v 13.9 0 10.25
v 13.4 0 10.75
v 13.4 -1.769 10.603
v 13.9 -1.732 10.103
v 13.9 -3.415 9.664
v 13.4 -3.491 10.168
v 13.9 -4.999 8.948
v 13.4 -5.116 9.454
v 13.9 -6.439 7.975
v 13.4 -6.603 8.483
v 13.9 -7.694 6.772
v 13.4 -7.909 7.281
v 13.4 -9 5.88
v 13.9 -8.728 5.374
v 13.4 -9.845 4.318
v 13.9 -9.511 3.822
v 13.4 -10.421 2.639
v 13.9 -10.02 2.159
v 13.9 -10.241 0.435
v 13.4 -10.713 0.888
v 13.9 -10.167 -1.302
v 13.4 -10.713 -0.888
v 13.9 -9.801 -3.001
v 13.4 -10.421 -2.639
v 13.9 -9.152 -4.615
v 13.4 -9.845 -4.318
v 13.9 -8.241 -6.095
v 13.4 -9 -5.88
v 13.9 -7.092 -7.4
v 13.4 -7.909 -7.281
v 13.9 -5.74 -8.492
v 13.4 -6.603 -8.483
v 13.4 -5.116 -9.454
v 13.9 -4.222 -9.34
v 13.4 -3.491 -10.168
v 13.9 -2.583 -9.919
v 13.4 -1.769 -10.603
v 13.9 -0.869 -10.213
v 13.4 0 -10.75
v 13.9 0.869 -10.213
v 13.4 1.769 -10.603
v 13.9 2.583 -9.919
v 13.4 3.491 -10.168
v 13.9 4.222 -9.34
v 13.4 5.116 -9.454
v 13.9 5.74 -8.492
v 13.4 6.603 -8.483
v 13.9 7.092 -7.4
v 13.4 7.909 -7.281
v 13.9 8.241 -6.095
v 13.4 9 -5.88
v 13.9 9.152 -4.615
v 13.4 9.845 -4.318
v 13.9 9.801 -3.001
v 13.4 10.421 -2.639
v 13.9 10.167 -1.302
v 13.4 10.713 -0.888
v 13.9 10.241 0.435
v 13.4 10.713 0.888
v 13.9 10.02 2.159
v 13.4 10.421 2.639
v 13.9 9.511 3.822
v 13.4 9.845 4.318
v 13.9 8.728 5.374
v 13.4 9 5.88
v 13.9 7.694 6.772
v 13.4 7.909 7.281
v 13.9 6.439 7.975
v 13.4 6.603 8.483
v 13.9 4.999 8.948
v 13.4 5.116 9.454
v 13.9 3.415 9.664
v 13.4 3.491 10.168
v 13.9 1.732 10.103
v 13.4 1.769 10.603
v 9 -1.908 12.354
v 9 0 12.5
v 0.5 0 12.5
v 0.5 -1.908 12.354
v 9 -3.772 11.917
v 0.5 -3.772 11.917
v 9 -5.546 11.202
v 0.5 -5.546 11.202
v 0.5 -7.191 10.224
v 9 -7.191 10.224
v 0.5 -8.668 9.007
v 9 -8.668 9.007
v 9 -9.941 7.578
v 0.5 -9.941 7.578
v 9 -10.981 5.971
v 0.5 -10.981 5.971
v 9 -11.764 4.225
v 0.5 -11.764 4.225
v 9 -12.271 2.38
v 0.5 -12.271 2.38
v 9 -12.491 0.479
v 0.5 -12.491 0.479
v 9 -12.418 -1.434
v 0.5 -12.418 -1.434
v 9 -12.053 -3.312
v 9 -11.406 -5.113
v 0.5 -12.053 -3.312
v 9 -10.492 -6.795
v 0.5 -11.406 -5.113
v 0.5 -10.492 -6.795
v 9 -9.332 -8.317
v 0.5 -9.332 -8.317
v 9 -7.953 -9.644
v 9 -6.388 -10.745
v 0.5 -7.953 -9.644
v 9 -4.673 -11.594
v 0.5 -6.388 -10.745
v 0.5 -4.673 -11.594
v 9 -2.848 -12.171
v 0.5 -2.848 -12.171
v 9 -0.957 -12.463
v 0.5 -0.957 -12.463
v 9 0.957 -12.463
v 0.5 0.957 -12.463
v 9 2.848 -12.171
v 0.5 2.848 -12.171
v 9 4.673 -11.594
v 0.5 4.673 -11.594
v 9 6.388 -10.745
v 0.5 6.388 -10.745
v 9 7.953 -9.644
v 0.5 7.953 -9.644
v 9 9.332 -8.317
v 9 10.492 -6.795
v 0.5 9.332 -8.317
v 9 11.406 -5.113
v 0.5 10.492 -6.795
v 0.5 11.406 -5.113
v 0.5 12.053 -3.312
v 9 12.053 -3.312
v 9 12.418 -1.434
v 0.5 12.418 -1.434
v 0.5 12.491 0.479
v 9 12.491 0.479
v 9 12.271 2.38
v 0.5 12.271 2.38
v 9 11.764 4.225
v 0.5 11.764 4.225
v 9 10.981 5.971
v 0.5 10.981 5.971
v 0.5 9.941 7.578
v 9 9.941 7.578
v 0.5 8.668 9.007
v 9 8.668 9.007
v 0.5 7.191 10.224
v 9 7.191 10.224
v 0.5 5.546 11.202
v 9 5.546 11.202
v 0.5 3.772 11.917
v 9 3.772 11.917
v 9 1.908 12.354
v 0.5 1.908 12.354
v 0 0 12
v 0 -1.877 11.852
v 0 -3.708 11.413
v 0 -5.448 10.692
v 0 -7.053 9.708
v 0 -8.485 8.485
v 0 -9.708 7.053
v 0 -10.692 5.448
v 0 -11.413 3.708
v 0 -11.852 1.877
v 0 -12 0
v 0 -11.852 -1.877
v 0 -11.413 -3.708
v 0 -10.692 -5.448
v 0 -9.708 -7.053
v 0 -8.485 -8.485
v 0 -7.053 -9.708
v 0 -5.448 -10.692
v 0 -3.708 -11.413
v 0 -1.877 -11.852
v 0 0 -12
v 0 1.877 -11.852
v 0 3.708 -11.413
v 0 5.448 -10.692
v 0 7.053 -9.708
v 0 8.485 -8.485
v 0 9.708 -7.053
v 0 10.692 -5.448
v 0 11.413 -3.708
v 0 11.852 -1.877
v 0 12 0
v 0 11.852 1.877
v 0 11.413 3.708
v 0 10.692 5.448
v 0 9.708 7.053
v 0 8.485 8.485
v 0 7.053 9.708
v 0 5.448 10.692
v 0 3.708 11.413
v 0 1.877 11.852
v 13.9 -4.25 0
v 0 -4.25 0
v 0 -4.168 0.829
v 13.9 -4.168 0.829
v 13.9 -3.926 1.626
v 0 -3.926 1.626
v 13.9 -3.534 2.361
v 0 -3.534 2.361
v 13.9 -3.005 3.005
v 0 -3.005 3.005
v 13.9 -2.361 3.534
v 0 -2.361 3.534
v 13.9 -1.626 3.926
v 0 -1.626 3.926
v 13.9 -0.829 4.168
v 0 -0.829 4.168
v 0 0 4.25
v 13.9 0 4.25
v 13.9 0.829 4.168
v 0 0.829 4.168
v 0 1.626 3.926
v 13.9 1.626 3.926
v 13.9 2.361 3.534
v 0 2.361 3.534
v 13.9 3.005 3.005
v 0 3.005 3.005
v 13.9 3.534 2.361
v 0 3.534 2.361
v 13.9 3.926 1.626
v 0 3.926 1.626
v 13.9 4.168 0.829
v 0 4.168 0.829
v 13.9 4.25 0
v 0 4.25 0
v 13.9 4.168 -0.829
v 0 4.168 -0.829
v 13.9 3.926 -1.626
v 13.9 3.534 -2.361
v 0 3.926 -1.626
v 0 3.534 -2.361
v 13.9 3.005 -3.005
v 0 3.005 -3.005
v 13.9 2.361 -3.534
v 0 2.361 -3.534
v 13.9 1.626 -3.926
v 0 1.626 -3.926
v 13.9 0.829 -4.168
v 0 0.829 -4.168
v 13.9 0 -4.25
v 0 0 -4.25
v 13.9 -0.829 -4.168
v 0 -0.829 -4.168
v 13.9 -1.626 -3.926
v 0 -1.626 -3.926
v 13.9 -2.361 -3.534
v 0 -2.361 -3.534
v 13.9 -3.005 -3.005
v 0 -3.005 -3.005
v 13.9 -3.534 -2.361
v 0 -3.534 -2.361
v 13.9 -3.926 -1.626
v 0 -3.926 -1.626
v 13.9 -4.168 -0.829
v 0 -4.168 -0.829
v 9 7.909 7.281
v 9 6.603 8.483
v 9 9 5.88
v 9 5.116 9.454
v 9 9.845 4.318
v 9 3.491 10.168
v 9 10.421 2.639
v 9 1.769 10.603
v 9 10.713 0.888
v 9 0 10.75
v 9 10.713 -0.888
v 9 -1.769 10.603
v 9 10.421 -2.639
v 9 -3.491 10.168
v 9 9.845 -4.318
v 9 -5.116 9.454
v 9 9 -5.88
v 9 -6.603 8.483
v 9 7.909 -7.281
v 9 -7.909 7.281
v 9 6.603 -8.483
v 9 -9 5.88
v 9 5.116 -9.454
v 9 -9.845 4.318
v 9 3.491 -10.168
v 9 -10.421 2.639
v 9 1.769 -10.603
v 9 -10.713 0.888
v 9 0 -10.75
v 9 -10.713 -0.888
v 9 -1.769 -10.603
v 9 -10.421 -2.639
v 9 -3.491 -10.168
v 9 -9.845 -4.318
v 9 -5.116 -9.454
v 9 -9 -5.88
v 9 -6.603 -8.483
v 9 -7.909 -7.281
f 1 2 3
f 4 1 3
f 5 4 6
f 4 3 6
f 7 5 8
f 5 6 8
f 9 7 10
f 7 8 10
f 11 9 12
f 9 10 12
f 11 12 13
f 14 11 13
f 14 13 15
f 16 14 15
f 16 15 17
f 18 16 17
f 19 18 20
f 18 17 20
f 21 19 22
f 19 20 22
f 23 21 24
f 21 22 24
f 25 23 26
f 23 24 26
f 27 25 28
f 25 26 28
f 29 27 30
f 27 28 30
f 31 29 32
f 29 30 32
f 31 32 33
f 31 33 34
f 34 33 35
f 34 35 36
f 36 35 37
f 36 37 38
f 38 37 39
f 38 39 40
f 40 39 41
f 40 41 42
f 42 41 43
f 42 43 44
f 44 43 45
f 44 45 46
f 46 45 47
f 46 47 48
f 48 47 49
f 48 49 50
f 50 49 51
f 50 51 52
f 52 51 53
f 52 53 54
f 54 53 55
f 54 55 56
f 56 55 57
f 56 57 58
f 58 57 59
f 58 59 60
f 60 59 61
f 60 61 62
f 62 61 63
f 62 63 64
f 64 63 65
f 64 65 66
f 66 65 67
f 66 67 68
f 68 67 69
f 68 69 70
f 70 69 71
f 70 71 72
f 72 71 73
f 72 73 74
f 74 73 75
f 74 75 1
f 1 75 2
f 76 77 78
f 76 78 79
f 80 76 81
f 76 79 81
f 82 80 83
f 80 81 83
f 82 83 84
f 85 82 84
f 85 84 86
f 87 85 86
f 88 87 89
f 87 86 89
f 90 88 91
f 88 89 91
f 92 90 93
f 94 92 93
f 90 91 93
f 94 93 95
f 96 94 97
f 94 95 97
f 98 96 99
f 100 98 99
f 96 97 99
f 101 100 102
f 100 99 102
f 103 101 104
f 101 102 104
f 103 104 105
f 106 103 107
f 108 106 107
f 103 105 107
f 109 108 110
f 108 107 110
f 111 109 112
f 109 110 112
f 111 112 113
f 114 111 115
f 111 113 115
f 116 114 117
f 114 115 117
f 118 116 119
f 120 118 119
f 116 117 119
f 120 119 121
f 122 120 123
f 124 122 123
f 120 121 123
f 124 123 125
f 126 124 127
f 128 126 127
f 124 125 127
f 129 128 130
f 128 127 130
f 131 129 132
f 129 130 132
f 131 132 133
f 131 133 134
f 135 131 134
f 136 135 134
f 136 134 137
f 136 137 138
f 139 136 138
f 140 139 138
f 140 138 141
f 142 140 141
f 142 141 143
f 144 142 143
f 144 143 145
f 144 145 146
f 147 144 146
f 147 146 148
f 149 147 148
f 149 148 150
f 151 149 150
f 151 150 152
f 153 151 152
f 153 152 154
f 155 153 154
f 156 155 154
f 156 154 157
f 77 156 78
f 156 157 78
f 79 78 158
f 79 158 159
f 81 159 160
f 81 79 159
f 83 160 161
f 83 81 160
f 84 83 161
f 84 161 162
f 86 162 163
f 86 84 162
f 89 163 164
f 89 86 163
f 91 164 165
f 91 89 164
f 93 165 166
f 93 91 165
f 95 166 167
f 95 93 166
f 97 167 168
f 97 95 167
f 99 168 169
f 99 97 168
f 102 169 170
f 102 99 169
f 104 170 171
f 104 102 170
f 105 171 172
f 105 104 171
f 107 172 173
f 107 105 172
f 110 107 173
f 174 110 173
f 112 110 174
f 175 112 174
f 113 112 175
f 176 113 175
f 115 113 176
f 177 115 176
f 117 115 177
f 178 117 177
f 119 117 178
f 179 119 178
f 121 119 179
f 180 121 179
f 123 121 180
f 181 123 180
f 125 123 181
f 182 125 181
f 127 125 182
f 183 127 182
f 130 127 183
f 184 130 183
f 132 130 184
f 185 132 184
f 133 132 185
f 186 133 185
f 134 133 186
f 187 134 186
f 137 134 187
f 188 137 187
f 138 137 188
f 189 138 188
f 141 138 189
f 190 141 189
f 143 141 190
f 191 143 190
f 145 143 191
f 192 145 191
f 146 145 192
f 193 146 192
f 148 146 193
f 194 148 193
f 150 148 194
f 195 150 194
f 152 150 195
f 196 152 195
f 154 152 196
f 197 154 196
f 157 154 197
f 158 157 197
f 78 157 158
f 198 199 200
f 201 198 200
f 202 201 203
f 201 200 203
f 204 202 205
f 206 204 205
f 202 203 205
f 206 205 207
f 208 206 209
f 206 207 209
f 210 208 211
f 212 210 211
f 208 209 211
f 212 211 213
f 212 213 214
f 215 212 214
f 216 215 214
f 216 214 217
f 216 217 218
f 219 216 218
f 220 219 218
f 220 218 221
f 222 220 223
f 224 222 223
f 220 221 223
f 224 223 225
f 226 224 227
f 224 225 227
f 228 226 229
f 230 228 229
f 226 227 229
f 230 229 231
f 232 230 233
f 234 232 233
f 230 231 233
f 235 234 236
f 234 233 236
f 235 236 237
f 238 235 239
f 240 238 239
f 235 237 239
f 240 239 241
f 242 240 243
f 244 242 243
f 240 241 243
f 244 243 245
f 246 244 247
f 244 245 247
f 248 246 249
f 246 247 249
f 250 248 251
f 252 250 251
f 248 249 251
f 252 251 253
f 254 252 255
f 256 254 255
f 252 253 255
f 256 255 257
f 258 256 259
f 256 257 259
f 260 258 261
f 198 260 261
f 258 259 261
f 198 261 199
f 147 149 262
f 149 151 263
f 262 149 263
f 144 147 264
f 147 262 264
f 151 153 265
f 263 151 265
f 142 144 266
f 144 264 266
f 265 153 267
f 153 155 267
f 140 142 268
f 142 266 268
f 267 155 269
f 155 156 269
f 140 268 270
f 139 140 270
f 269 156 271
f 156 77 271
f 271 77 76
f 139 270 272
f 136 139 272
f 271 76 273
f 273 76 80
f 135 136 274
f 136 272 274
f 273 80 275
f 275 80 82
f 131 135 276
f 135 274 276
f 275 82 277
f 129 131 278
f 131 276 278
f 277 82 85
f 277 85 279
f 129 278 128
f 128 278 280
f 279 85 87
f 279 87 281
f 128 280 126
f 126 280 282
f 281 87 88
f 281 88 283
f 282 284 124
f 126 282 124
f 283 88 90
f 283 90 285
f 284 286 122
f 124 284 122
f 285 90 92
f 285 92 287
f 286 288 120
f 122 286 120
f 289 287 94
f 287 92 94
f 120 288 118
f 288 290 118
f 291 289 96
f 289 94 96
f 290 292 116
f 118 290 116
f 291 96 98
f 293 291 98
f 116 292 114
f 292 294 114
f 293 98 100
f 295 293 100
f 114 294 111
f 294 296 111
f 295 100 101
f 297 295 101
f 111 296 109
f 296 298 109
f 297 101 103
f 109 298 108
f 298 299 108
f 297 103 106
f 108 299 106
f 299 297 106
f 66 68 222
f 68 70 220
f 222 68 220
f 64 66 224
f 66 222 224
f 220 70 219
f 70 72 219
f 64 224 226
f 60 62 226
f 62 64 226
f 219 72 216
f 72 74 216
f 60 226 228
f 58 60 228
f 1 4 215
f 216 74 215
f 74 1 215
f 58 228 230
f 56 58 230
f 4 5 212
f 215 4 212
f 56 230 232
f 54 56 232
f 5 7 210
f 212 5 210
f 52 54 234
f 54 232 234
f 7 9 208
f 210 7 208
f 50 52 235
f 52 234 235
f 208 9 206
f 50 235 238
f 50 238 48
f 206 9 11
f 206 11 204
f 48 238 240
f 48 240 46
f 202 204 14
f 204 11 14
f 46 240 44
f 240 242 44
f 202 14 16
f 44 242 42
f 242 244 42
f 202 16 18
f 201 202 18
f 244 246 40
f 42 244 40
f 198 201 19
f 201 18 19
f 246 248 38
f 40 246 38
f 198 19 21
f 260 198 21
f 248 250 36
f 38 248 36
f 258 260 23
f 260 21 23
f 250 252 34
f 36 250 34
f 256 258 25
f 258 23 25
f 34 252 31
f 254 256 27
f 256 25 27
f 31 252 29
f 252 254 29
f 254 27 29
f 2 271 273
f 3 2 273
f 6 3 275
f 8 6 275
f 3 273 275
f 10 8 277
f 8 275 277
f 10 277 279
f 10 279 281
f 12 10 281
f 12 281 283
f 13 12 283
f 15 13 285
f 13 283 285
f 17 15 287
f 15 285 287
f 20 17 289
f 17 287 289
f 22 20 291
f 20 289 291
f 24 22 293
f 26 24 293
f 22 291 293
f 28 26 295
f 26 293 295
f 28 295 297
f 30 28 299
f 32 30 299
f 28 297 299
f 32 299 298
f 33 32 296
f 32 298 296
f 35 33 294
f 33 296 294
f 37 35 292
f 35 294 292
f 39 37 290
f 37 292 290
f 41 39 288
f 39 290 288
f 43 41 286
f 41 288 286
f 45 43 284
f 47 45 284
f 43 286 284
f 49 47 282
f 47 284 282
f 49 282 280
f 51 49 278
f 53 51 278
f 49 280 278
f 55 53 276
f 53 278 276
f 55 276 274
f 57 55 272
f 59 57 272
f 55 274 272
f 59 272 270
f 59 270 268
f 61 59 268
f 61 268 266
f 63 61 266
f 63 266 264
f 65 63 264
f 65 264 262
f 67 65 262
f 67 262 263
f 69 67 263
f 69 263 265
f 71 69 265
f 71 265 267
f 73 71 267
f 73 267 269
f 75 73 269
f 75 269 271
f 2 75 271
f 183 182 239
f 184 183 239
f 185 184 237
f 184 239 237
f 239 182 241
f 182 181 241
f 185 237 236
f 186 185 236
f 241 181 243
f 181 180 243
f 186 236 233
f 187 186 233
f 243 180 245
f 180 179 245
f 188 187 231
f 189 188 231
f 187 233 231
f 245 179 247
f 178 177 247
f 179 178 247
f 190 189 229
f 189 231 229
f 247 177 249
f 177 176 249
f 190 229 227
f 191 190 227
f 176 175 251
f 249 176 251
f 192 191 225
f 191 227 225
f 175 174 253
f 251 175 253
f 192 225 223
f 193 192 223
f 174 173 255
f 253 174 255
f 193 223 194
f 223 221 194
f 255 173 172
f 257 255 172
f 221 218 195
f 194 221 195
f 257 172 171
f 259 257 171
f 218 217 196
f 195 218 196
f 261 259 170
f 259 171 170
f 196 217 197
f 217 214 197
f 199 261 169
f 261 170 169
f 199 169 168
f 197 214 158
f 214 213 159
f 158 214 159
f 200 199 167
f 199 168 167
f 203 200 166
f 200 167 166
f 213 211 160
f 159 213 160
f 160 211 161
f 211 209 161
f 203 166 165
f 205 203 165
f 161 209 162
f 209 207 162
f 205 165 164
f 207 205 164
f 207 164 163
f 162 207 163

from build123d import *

# Parameters (mm, degrees)
F2_R     = 4.25
F3_DEPTH = 13.9
F4_SIZE  = 0.5


with BuildPart() as f1:
    # F0 (on Front) → F1 (revolve)
    with BuildSketch(Plane.XZ):
        Polygon((0, 12.5), (0, 0), (13.9, 0), (13.9, 10.75), (9, 10.75), (9, 12.5), align=None)
    revolve(axis=Axis((6.95, 0, 0), (1, 0, 0)))

    # F2 (on face) → F3 (cut, through all)
    with BuildSketch(Plane(origin=(0, 0, 0), x_dir=(0, -1, 0), z_dir=(-1, 0, 0))):
        Circle(F2_R)
    extrude(amount=-F3_DEPTH, mode=Mode.SUBTRACT)

    # F4
    f4_edges = [f1.edges().sort_by_distance(p)[0] for p in [
        (13.9, 0, -10.75),
        (0, 0, -12.5),
    ]]
    chamfer(f4_edges, length=F4_SIZE)


solid = f1.part
